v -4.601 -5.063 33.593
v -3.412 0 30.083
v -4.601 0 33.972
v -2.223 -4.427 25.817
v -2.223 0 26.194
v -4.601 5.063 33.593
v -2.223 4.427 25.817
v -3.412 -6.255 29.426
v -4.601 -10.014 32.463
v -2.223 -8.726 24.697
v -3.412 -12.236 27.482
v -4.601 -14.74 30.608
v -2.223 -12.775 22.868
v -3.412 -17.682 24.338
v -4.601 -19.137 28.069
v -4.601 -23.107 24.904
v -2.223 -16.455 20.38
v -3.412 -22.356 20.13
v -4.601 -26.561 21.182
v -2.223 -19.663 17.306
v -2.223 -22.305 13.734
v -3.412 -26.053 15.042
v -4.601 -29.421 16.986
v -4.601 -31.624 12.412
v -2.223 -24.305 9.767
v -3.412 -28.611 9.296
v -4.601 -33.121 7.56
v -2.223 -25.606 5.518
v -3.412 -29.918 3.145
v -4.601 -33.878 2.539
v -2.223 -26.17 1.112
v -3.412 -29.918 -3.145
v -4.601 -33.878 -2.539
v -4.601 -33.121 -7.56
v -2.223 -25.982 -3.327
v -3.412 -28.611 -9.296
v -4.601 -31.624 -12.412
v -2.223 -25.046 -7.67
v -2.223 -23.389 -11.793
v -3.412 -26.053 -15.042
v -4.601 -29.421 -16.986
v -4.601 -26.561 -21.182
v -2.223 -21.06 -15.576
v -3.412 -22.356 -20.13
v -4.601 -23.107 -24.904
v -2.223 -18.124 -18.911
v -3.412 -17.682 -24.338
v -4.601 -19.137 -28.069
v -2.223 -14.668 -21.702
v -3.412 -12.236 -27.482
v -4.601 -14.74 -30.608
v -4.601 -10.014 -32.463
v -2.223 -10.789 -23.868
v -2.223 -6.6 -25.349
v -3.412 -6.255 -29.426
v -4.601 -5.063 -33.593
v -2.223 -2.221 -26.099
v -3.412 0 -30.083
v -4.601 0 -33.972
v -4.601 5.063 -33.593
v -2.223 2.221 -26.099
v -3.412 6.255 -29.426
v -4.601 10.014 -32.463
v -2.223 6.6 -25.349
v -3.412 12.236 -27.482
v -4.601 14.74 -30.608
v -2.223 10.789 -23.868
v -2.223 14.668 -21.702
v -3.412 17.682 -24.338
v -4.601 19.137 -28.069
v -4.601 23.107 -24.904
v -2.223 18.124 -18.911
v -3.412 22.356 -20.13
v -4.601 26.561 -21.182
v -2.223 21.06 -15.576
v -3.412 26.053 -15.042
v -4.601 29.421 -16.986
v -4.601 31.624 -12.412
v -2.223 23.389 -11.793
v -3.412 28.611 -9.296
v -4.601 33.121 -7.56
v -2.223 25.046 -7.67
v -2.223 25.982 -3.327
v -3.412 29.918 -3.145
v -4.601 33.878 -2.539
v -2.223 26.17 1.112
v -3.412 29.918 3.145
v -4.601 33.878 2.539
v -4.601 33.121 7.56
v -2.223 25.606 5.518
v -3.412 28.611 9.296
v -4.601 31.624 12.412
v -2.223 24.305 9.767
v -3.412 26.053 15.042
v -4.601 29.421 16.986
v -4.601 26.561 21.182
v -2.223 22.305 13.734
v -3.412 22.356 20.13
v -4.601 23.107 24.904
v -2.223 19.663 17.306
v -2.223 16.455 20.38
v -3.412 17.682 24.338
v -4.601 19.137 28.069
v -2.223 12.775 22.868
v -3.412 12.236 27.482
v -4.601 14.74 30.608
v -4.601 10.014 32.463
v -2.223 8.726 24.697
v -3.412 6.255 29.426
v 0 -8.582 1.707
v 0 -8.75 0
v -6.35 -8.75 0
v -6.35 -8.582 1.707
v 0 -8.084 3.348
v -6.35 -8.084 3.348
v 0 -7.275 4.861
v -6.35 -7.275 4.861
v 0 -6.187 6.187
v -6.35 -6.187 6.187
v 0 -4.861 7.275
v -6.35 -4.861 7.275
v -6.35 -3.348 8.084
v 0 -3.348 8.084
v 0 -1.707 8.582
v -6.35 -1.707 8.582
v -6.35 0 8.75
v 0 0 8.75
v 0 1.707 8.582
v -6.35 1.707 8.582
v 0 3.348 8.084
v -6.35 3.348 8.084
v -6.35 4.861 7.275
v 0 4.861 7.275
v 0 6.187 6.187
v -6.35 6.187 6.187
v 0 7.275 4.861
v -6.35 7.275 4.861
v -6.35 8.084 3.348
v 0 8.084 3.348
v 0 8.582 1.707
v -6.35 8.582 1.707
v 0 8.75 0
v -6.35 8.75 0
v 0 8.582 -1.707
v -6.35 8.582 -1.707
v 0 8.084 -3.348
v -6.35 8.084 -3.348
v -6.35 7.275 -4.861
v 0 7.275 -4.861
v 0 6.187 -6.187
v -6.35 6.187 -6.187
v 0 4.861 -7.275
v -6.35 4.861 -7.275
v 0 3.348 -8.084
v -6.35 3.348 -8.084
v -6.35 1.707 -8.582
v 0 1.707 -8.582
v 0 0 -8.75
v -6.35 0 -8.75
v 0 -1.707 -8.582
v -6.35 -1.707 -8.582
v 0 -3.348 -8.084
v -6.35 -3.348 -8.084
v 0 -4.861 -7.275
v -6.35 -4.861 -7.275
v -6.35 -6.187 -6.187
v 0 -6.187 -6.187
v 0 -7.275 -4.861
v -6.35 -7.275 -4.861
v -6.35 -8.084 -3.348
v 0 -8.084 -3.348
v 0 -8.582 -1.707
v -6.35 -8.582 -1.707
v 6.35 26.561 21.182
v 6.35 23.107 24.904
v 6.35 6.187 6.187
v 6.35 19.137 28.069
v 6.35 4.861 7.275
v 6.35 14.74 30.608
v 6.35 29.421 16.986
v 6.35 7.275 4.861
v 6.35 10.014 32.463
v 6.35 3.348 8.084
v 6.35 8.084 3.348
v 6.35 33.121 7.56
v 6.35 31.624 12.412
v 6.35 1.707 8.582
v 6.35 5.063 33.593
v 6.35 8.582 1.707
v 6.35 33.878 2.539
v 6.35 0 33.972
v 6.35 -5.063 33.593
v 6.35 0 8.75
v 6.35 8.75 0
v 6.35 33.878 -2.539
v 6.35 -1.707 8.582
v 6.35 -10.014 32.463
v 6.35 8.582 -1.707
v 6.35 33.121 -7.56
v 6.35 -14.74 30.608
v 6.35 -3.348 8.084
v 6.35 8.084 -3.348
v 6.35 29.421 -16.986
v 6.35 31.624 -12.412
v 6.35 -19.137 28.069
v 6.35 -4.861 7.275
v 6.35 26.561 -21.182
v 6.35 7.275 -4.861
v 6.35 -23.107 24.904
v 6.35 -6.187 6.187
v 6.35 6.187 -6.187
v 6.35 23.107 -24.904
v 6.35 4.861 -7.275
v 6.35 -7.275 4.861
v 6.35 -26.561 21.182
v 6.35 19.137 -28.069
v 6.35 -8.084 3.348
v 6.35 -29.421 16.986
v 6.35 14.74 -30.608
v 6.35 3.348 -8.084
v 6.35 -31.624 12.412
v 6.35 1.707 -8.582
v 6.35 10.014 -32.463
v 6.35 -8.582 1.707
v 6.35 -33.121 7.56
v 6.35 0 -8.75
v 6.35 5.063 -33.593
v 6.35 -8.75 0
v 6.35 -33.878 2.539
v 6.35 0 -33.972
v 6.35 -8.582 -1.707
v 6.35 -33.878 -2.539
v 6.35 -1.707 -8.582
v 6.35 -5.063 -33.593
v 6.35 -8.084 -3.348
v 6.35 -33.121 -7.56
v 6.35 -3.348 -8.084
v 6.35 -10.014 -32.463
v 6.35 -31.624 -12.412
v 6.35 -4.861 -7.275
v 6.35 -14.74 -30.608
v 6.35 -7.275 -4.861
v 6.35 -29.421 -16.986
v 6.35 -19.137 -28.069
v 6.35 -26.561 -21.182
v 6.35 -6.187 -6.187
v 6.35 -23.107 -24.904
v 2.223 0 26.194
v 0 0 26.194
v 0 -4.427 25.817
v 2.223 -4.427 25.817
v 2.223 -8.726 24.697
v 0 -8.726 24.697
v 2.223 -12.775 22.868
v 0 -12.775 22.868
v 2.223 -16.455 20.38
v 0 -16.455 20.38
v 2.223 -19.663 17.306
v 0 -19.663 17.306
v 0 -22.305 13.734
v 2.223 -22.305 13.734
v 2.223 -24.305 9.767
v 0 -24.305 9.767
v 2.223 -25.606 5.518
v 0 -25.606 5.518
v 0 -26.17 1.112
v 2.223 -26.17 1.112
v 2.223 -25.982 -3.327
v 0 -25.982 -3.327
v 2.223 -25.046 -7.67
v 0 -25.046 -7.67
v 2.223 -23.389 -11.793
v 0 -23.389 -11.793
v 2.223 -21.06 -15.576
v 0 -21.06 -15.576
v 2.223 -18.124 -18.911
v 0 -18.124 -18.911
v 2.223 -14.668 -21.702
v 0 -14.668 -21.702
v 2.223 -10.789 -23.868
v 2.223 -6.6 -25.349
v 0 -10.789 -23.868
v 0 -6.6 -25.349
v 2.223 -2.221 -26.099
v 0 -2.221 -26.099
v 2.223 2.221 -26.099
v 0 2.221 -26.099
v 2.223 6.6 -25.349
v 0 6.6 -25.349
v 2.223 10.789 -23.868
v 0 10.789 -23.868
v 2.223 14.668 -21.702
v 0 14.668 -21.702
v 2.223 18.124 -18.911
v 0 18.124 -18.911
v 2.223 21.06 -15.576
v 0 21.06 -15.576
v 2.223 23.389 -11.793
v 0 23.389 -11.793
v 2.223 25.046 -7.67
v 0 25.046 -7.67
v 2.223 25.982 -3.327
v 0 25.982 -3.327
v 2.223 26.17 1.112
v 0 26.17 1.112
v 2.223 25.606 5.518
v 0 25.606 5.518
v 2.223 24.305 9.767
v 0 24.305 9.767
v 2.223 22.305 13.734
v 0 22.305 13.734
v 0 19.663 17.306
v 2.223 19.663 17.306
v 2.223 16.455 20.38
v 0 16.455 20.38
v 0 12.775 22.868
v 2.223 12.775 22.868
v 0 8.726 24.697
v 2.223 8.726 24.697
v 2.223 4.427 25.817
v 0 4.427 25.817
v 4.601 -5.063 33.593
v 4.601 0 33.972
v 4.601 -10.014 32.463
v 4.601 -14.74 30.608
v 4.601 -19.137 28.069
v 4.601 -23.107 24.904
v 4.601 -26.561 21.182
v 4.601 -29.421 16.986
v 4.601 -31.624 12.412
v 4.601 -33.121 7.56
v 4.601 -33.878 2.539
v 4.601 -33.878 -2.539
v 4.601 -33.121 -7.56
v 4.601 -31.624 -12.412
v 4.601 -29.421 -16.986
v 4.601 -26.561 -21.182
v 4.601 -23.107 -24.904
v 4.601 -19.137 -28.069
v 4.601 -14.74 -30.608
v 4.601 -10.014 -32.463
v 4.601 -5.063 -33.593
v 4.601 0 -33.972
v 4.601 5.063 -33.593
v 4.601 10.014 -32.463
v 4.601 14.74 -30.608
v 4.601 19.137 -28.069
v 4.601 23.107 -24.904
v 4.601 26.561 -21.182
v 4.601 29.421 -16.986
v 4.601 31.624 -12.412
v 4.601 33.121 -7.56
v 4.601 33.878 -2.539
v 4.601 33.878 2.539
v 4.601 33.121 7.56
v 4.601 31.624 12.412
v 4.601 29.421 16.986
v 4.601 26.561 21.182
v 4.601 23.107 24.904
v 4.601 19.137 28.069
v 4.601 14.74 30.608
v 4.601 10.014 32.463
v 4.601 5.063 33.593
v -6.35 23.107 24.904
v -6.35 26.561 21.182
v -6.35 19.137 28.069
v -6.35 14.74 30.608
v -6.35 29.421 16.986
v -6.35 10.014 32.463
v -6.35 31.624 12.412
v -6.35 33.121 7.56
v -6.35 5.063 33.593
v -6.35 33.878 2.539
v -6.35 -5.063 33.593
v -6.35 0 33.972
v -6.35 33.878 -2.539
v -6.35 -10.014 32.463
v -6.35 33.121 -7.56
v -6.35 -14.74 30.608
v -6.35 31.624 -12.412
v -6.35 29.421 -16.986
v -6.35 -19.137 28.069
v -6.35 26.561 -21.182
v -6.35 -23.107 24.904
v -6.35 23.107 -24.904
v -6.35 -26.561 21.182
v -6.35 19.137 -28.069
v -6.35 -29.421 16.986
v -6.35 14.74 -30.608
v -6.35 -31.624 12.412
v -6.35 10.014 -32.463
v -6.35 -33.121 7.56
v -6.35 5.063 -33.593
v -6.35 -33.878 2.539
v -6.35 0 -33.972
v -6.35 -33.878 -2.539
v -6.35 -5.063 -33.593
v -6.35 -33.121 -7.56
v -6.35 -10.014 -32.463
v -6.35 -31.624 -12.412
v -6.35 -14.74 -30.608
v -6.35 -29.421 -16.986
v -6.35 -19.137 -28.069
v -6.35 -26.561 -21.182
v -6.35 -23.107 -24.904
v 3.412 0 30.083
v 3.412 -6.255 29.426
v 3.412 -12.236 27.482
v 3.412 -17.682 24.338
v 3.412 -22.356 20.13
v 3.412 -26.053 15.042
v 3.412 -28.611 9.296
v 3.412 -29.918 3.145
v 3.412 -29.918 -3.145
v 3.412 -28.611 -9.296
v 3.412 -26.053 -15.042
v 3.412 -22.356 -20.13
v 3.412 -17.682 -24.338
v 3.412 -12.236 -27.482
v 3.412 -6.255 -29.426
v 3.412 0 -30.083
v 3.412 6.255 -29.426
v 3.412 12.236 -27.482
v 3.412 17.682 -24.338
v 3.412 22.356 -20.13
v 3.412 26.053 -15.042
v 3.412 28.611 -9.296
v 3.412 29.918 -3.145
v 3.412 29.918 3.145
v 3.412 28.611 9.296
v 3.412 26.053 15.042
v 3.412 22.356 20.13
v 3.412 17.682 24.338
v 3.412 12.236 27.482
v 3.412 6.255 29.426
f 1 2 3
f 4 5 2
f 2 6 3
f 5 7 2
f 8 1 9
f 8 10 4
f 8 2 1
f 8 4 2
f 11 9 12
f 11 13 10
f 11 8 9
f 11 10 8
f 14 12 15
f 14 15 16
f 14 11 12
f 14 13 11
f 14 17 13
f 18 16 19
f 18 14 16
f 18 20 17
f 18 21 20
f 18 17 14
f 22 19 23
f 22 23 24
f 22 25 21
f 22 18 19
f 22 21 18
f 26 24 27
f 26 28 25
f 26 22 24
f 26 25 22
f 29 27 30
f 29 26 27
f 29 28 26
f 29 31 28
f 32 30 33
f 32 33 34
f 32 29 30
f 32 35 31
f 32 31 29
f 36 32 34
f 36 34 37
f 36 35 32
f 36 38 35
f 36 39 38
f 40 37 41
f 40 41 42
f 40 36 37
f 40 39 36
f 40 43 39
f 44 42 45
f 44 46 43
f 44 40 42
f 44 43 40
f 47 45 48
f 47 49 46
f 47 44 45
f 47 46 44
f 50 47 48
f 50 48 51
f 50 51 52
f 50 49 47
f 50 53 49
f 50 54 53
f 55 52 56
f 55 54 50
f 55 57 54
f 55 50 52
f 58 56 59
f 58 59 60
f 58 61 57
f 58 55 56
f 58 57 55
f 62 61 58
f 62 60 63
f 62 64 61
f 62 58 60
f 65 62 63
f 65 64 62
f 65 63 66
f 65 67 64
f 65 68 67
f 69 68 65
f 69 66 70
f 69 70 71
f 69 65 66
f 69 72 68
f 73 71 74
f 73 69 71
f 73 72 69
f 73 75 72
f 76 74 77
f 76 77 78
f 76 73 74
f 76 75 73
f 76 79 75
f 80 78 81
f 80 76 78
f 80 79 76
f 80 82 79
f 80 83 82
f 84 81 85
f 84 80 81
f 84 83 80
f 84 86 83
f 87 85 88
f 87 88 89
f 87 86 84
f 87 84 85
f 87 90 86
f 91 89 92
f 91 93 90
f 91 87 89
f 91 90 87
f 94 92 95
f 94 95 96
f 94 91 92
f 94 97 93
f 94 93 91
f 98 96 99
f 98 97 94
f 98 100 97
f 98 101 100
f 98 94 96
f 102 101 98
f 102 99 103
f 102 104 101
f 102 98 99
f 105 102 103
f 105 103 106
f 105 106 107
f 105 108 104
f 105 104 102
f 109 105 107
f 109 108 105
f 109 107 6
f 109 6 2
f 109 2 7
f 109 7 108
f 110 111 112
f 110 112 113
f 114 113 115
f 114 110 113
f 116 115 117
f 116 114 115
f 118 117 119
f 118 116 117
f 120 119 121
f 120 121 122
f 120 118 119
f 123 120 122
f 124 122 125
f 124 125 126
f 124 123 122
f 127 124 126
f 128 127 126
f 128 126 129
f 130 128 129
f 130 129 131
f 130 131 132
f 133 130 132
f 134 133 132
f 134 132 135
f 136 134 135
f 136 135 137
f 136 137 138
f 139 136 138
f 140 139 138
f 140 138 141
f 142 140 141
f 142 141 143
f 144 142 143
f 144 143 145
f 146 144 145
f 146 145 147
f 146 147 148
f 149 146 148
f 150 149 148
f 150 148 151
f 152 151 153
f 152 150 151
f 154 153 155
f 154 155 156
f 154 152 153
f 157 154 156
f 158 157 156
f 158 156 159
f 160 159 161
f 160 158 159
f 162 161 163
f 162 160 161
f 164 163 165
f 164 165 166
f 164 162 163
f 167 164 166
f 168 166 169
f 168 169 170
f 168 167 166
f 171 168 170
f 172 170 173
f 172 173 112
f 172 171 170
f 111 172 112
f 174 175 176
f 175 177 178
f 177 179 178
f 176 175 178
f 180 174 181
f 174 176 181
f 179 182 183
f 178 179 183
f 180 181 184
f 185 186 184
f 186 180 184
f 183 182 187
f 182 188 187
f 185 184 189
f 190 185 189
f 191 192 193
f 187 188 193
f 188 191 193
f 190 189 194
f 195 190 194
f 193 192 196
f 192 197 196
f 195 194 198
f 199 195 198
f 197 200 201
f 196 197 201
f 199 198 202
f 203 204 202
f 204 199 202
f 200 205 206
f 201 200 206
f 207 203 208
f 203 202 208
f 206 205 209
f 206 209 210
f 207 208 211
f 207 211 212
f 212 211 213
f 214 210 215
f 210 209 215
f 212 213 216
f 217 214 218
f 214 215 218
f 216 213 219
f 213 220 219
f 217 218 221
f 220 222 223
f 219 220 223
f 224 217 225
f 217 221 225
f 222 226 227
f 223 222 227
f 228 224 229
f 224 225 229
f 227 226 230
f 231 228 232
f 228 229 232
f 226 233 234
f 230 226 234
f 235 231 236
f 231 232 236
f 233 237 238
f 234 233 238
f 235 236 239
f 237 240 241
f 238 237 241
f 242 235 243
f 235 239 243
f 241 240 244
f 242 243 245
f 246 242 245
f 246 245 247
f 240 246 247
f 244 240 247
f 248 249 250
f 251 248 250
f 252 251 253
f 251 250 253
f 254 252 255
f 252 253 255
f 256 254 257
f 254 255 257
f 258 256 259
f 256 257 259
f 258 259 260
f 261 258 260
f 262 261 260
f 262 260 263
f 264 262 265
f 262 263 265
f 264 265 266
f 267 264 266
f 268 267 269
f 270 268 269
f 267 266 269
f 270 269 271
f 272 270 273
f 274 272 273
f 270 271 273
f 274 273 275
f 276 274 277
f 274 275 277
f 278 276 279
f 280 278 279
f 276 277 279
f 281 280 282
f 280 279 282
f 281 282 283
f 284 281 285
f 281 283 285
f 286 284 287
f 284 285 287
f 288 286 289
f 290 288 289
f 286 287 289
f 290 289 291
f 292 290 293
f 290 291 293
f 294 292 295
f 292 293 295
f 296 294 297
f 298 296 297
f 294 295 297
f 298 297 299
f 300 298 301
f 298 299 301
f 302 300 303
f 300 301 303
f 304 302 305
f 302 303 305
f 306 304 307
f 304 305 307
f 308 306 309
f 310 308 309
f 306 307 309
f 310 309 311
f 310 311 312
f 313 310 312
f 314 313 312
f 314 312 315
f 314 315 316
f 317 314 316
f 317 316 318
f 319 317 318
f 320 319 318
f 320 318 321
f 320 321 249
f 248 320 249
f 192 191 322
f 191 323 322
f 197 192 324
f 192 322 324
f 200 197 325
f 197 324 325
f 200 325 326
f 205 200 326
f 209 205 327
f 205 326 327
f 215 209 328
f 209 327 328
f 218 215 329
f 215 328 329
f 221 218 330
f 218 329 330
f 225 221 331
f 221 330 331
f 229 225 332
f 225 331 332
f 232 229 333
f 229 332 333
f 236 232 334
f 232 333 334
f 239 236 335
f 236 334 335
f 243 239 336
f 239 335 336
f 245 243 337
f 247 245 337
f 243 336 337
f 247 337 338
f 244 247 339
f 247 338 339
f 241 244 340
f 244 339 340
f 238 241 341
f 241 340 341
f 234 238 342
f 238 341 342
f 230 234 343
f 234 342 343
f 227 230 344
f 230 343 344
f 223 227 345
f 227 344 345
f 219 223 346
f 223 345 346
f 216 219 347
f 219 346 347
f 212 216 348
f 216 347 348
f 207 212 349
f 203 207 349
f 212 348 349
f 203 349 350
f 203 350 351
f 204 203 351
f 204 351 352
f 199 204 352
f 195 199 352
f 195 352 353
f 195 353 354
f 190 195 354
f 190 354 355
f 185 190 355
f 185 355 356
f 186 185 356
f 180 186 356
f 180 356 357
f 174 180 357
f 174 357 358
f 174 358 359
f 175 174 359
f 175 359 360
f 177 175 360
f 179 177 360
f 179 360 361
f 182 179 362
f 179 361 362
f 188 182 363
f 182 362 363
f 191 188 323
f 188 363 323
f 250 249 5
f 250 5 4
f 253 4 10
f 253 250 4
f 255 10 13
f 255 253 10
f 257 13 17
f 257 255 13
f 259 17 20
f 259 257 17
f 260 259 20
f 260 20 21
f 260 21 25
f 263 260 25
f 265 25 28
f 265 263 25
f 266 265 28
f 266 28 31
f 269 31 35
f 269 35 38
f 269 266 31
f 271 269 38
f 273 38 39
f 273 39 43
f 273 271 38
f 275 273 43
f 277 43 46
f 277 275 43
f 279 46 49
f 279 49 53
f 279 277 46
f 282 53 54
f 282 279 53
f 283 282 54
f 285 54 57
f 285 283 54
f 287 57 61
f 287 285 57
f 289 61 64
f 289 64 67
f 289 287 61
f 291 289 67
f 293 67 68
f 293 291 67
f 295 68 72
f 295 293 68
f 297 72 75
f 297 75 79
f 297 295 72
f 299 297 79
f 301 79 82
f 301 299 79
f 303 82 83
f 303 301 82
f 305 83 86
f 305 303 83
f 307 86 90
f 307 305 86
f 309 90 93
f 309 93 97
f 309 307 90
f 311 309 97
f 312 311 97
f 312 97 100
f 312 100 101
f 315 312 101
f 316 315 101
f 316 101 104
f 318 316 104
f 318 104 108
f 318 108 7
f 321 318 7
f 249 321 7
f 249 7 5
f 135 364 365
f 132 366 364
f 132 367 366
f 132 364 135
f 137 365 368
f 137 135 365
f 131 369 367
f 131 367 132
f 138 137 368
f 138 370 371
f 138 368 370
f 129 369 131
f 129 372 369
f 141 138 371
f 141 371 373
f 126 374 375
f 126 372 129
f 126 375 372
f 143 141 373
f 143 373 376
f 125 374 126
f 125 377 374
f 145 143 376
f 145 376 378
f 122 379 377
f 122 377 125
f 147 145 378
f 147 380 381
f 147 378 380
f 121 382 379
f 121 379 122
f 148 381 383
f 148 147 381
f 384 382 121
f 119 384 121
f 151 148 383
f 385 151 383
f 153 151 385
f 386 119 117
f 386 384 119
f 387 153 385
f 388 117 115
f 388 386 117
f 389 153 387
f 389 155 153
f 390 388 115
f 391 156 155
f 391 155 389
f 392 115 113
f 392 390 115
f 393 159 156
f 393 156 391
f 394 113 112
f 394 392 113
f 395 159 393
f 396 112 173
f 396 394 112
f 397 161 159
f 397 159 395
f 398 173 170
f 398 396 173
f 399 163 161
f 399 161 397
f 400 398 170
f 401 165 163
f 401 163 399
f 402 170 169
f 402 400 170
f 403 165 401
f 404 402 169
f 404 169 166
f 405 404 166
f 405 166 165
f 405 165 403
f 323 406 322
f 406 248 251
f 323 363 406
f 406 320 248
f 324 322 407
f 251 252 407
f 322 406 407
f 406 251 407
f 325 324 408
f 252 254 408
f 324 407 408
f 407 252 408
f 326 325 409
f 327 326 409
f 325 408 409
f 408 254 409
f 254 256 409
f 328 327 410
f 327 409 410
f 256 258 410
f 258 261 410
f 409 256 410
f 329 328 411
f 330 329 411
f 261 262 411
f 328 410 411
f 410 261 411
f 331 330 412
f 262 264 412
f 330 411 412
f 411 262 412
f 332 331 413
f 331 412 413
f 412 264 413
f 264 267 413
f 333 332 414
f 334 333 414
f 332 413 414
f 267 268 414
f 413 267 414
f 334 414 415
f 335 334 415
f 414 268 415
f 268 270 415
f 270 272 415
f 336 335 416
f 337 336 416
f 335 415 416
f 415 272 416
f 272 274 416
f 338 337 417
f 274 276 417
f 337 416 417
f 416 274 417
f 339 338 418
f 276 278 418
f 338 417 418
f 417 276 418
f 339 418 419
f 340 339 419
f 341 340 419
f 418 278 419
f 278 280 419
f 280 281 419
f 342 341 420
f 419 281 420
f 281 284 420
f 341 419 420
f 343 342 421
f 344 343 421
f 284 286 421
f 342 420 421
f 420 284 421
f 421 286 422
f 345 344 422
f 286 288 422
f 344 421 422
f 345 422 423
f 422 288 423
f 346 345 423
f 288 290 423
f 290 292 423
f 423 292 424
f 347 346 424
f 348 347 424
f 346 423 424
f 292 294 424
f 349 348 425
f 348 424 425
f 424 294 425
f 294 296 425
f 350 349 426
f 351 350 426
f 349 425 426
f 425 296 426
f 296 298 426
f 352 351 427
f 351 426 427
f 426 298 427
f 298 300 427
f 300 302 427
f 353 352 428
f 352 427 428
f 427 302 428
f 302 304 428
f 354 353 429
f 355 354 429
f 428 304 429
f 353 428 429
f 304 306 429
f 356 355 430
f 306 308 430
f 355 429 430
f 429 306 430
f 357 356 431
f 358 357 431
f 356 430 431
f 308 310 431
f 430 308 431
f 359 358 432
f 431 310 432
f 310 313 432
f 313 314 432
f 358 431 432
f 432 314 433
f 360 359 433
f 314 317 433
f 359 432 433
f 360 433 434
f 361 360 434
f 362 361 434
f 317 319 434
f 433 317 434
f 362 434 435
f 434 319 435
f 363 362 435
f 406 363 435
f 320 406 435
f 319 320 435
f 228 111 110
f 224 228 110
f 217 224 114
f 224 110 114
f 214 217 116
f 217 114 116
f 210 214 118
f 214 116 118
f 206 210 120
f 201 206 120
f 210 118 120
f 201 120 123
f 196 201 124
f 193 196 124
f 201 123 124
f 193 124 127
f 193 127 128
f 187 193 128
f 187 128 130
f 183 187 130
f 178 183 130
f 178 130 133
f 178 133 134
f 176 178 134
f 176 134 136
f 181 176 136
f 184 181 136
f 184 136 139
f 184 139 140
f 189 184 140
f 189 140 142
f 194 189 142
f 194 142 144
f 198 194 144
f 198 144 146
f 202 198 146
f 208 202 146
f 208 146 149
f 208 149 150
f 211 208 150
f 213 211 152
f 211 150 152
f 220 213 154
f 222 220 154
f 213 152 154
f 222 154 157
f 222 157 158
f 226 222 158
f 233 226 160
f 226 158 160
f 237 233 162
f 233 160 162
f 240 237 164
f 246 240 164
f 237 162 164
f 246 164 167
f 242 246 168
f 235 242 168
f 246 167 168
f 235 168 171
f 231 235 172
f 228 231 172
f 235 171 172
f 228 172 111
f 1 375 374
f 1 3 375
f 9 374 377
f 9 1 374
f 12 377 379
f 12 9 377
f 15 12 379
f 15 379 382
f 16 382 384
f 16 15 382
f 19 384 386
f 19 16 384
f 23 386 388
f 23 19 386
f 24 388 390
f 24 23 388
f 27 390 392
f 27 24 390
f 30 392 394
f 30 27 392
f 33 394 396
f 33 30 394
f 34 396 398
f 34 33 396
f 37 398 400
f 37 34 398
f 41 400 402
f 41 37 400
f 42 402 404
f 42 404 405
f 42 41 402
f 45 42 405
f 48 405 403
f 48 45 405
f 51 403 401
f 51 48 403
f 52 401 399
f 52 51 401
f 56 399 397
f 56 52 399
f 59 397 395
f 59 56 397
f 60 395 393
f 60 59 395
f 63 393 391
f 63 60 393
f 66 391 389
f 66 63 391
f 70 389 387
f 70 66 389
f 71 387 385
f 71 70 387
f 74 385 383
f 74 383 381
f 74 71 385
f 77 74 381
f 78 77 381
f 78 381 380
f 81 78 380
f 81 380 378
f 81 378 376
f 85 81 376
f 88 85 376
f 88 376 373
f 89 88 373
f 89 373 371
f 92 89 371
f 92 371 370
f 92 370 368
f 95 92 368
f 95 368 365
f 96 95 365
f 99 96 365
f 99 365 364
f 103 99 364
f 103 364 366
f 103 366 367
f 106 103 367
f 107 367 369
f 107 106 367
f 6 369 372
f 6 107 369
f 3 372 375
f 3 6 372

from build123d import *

# Parameters (mm, degrees)
F2_R     = 17.5
F3_DEPTH = 25
F5_SCALE = 0.5


with BuildPart() as f1:
    # F0 (on Front) → F1 (revolve)
    with BuildSketch(Plane.XZ):
        Polygon((0, 37.8452404466), (0, 0), (12.7, 0), (12.7, 52.3875), (4.4460149232, 52.3875), align=None)
        Polygon((0, 52.3875), (0, 37.8452404466), (4.4460149232, 52.3875), align=None)
        Polygon((9.20242, 67.945), (4.4460149232, 52.3875), (12.7, 52.3875), (12.7, 67.945), align=None)
    revolve(axis=Axis((21.4788783342, 0, 0), (1, 0, 0)))

    # F2 (on face) → F3 (cut)
    with BuildSketch(Plane(origin=(0, 0, 0), x_dir=(0, -1, 0), z_dir=(-1, 0, 0))):
        Circle(F2_R)
    extrude(amount=-F3_DEPTH, mode=Mode.SUBTRACT)

    # F4: F1 across plane


with BuildPart() as f1_1:
    add(f1.part)
    add(f1.part.mirror(Plane.YZ))


with BuildPart() as f1_2:
    # F5: moved
    add(f1_1.part.scale(F5_SCALE))


solid = f1_2.part
